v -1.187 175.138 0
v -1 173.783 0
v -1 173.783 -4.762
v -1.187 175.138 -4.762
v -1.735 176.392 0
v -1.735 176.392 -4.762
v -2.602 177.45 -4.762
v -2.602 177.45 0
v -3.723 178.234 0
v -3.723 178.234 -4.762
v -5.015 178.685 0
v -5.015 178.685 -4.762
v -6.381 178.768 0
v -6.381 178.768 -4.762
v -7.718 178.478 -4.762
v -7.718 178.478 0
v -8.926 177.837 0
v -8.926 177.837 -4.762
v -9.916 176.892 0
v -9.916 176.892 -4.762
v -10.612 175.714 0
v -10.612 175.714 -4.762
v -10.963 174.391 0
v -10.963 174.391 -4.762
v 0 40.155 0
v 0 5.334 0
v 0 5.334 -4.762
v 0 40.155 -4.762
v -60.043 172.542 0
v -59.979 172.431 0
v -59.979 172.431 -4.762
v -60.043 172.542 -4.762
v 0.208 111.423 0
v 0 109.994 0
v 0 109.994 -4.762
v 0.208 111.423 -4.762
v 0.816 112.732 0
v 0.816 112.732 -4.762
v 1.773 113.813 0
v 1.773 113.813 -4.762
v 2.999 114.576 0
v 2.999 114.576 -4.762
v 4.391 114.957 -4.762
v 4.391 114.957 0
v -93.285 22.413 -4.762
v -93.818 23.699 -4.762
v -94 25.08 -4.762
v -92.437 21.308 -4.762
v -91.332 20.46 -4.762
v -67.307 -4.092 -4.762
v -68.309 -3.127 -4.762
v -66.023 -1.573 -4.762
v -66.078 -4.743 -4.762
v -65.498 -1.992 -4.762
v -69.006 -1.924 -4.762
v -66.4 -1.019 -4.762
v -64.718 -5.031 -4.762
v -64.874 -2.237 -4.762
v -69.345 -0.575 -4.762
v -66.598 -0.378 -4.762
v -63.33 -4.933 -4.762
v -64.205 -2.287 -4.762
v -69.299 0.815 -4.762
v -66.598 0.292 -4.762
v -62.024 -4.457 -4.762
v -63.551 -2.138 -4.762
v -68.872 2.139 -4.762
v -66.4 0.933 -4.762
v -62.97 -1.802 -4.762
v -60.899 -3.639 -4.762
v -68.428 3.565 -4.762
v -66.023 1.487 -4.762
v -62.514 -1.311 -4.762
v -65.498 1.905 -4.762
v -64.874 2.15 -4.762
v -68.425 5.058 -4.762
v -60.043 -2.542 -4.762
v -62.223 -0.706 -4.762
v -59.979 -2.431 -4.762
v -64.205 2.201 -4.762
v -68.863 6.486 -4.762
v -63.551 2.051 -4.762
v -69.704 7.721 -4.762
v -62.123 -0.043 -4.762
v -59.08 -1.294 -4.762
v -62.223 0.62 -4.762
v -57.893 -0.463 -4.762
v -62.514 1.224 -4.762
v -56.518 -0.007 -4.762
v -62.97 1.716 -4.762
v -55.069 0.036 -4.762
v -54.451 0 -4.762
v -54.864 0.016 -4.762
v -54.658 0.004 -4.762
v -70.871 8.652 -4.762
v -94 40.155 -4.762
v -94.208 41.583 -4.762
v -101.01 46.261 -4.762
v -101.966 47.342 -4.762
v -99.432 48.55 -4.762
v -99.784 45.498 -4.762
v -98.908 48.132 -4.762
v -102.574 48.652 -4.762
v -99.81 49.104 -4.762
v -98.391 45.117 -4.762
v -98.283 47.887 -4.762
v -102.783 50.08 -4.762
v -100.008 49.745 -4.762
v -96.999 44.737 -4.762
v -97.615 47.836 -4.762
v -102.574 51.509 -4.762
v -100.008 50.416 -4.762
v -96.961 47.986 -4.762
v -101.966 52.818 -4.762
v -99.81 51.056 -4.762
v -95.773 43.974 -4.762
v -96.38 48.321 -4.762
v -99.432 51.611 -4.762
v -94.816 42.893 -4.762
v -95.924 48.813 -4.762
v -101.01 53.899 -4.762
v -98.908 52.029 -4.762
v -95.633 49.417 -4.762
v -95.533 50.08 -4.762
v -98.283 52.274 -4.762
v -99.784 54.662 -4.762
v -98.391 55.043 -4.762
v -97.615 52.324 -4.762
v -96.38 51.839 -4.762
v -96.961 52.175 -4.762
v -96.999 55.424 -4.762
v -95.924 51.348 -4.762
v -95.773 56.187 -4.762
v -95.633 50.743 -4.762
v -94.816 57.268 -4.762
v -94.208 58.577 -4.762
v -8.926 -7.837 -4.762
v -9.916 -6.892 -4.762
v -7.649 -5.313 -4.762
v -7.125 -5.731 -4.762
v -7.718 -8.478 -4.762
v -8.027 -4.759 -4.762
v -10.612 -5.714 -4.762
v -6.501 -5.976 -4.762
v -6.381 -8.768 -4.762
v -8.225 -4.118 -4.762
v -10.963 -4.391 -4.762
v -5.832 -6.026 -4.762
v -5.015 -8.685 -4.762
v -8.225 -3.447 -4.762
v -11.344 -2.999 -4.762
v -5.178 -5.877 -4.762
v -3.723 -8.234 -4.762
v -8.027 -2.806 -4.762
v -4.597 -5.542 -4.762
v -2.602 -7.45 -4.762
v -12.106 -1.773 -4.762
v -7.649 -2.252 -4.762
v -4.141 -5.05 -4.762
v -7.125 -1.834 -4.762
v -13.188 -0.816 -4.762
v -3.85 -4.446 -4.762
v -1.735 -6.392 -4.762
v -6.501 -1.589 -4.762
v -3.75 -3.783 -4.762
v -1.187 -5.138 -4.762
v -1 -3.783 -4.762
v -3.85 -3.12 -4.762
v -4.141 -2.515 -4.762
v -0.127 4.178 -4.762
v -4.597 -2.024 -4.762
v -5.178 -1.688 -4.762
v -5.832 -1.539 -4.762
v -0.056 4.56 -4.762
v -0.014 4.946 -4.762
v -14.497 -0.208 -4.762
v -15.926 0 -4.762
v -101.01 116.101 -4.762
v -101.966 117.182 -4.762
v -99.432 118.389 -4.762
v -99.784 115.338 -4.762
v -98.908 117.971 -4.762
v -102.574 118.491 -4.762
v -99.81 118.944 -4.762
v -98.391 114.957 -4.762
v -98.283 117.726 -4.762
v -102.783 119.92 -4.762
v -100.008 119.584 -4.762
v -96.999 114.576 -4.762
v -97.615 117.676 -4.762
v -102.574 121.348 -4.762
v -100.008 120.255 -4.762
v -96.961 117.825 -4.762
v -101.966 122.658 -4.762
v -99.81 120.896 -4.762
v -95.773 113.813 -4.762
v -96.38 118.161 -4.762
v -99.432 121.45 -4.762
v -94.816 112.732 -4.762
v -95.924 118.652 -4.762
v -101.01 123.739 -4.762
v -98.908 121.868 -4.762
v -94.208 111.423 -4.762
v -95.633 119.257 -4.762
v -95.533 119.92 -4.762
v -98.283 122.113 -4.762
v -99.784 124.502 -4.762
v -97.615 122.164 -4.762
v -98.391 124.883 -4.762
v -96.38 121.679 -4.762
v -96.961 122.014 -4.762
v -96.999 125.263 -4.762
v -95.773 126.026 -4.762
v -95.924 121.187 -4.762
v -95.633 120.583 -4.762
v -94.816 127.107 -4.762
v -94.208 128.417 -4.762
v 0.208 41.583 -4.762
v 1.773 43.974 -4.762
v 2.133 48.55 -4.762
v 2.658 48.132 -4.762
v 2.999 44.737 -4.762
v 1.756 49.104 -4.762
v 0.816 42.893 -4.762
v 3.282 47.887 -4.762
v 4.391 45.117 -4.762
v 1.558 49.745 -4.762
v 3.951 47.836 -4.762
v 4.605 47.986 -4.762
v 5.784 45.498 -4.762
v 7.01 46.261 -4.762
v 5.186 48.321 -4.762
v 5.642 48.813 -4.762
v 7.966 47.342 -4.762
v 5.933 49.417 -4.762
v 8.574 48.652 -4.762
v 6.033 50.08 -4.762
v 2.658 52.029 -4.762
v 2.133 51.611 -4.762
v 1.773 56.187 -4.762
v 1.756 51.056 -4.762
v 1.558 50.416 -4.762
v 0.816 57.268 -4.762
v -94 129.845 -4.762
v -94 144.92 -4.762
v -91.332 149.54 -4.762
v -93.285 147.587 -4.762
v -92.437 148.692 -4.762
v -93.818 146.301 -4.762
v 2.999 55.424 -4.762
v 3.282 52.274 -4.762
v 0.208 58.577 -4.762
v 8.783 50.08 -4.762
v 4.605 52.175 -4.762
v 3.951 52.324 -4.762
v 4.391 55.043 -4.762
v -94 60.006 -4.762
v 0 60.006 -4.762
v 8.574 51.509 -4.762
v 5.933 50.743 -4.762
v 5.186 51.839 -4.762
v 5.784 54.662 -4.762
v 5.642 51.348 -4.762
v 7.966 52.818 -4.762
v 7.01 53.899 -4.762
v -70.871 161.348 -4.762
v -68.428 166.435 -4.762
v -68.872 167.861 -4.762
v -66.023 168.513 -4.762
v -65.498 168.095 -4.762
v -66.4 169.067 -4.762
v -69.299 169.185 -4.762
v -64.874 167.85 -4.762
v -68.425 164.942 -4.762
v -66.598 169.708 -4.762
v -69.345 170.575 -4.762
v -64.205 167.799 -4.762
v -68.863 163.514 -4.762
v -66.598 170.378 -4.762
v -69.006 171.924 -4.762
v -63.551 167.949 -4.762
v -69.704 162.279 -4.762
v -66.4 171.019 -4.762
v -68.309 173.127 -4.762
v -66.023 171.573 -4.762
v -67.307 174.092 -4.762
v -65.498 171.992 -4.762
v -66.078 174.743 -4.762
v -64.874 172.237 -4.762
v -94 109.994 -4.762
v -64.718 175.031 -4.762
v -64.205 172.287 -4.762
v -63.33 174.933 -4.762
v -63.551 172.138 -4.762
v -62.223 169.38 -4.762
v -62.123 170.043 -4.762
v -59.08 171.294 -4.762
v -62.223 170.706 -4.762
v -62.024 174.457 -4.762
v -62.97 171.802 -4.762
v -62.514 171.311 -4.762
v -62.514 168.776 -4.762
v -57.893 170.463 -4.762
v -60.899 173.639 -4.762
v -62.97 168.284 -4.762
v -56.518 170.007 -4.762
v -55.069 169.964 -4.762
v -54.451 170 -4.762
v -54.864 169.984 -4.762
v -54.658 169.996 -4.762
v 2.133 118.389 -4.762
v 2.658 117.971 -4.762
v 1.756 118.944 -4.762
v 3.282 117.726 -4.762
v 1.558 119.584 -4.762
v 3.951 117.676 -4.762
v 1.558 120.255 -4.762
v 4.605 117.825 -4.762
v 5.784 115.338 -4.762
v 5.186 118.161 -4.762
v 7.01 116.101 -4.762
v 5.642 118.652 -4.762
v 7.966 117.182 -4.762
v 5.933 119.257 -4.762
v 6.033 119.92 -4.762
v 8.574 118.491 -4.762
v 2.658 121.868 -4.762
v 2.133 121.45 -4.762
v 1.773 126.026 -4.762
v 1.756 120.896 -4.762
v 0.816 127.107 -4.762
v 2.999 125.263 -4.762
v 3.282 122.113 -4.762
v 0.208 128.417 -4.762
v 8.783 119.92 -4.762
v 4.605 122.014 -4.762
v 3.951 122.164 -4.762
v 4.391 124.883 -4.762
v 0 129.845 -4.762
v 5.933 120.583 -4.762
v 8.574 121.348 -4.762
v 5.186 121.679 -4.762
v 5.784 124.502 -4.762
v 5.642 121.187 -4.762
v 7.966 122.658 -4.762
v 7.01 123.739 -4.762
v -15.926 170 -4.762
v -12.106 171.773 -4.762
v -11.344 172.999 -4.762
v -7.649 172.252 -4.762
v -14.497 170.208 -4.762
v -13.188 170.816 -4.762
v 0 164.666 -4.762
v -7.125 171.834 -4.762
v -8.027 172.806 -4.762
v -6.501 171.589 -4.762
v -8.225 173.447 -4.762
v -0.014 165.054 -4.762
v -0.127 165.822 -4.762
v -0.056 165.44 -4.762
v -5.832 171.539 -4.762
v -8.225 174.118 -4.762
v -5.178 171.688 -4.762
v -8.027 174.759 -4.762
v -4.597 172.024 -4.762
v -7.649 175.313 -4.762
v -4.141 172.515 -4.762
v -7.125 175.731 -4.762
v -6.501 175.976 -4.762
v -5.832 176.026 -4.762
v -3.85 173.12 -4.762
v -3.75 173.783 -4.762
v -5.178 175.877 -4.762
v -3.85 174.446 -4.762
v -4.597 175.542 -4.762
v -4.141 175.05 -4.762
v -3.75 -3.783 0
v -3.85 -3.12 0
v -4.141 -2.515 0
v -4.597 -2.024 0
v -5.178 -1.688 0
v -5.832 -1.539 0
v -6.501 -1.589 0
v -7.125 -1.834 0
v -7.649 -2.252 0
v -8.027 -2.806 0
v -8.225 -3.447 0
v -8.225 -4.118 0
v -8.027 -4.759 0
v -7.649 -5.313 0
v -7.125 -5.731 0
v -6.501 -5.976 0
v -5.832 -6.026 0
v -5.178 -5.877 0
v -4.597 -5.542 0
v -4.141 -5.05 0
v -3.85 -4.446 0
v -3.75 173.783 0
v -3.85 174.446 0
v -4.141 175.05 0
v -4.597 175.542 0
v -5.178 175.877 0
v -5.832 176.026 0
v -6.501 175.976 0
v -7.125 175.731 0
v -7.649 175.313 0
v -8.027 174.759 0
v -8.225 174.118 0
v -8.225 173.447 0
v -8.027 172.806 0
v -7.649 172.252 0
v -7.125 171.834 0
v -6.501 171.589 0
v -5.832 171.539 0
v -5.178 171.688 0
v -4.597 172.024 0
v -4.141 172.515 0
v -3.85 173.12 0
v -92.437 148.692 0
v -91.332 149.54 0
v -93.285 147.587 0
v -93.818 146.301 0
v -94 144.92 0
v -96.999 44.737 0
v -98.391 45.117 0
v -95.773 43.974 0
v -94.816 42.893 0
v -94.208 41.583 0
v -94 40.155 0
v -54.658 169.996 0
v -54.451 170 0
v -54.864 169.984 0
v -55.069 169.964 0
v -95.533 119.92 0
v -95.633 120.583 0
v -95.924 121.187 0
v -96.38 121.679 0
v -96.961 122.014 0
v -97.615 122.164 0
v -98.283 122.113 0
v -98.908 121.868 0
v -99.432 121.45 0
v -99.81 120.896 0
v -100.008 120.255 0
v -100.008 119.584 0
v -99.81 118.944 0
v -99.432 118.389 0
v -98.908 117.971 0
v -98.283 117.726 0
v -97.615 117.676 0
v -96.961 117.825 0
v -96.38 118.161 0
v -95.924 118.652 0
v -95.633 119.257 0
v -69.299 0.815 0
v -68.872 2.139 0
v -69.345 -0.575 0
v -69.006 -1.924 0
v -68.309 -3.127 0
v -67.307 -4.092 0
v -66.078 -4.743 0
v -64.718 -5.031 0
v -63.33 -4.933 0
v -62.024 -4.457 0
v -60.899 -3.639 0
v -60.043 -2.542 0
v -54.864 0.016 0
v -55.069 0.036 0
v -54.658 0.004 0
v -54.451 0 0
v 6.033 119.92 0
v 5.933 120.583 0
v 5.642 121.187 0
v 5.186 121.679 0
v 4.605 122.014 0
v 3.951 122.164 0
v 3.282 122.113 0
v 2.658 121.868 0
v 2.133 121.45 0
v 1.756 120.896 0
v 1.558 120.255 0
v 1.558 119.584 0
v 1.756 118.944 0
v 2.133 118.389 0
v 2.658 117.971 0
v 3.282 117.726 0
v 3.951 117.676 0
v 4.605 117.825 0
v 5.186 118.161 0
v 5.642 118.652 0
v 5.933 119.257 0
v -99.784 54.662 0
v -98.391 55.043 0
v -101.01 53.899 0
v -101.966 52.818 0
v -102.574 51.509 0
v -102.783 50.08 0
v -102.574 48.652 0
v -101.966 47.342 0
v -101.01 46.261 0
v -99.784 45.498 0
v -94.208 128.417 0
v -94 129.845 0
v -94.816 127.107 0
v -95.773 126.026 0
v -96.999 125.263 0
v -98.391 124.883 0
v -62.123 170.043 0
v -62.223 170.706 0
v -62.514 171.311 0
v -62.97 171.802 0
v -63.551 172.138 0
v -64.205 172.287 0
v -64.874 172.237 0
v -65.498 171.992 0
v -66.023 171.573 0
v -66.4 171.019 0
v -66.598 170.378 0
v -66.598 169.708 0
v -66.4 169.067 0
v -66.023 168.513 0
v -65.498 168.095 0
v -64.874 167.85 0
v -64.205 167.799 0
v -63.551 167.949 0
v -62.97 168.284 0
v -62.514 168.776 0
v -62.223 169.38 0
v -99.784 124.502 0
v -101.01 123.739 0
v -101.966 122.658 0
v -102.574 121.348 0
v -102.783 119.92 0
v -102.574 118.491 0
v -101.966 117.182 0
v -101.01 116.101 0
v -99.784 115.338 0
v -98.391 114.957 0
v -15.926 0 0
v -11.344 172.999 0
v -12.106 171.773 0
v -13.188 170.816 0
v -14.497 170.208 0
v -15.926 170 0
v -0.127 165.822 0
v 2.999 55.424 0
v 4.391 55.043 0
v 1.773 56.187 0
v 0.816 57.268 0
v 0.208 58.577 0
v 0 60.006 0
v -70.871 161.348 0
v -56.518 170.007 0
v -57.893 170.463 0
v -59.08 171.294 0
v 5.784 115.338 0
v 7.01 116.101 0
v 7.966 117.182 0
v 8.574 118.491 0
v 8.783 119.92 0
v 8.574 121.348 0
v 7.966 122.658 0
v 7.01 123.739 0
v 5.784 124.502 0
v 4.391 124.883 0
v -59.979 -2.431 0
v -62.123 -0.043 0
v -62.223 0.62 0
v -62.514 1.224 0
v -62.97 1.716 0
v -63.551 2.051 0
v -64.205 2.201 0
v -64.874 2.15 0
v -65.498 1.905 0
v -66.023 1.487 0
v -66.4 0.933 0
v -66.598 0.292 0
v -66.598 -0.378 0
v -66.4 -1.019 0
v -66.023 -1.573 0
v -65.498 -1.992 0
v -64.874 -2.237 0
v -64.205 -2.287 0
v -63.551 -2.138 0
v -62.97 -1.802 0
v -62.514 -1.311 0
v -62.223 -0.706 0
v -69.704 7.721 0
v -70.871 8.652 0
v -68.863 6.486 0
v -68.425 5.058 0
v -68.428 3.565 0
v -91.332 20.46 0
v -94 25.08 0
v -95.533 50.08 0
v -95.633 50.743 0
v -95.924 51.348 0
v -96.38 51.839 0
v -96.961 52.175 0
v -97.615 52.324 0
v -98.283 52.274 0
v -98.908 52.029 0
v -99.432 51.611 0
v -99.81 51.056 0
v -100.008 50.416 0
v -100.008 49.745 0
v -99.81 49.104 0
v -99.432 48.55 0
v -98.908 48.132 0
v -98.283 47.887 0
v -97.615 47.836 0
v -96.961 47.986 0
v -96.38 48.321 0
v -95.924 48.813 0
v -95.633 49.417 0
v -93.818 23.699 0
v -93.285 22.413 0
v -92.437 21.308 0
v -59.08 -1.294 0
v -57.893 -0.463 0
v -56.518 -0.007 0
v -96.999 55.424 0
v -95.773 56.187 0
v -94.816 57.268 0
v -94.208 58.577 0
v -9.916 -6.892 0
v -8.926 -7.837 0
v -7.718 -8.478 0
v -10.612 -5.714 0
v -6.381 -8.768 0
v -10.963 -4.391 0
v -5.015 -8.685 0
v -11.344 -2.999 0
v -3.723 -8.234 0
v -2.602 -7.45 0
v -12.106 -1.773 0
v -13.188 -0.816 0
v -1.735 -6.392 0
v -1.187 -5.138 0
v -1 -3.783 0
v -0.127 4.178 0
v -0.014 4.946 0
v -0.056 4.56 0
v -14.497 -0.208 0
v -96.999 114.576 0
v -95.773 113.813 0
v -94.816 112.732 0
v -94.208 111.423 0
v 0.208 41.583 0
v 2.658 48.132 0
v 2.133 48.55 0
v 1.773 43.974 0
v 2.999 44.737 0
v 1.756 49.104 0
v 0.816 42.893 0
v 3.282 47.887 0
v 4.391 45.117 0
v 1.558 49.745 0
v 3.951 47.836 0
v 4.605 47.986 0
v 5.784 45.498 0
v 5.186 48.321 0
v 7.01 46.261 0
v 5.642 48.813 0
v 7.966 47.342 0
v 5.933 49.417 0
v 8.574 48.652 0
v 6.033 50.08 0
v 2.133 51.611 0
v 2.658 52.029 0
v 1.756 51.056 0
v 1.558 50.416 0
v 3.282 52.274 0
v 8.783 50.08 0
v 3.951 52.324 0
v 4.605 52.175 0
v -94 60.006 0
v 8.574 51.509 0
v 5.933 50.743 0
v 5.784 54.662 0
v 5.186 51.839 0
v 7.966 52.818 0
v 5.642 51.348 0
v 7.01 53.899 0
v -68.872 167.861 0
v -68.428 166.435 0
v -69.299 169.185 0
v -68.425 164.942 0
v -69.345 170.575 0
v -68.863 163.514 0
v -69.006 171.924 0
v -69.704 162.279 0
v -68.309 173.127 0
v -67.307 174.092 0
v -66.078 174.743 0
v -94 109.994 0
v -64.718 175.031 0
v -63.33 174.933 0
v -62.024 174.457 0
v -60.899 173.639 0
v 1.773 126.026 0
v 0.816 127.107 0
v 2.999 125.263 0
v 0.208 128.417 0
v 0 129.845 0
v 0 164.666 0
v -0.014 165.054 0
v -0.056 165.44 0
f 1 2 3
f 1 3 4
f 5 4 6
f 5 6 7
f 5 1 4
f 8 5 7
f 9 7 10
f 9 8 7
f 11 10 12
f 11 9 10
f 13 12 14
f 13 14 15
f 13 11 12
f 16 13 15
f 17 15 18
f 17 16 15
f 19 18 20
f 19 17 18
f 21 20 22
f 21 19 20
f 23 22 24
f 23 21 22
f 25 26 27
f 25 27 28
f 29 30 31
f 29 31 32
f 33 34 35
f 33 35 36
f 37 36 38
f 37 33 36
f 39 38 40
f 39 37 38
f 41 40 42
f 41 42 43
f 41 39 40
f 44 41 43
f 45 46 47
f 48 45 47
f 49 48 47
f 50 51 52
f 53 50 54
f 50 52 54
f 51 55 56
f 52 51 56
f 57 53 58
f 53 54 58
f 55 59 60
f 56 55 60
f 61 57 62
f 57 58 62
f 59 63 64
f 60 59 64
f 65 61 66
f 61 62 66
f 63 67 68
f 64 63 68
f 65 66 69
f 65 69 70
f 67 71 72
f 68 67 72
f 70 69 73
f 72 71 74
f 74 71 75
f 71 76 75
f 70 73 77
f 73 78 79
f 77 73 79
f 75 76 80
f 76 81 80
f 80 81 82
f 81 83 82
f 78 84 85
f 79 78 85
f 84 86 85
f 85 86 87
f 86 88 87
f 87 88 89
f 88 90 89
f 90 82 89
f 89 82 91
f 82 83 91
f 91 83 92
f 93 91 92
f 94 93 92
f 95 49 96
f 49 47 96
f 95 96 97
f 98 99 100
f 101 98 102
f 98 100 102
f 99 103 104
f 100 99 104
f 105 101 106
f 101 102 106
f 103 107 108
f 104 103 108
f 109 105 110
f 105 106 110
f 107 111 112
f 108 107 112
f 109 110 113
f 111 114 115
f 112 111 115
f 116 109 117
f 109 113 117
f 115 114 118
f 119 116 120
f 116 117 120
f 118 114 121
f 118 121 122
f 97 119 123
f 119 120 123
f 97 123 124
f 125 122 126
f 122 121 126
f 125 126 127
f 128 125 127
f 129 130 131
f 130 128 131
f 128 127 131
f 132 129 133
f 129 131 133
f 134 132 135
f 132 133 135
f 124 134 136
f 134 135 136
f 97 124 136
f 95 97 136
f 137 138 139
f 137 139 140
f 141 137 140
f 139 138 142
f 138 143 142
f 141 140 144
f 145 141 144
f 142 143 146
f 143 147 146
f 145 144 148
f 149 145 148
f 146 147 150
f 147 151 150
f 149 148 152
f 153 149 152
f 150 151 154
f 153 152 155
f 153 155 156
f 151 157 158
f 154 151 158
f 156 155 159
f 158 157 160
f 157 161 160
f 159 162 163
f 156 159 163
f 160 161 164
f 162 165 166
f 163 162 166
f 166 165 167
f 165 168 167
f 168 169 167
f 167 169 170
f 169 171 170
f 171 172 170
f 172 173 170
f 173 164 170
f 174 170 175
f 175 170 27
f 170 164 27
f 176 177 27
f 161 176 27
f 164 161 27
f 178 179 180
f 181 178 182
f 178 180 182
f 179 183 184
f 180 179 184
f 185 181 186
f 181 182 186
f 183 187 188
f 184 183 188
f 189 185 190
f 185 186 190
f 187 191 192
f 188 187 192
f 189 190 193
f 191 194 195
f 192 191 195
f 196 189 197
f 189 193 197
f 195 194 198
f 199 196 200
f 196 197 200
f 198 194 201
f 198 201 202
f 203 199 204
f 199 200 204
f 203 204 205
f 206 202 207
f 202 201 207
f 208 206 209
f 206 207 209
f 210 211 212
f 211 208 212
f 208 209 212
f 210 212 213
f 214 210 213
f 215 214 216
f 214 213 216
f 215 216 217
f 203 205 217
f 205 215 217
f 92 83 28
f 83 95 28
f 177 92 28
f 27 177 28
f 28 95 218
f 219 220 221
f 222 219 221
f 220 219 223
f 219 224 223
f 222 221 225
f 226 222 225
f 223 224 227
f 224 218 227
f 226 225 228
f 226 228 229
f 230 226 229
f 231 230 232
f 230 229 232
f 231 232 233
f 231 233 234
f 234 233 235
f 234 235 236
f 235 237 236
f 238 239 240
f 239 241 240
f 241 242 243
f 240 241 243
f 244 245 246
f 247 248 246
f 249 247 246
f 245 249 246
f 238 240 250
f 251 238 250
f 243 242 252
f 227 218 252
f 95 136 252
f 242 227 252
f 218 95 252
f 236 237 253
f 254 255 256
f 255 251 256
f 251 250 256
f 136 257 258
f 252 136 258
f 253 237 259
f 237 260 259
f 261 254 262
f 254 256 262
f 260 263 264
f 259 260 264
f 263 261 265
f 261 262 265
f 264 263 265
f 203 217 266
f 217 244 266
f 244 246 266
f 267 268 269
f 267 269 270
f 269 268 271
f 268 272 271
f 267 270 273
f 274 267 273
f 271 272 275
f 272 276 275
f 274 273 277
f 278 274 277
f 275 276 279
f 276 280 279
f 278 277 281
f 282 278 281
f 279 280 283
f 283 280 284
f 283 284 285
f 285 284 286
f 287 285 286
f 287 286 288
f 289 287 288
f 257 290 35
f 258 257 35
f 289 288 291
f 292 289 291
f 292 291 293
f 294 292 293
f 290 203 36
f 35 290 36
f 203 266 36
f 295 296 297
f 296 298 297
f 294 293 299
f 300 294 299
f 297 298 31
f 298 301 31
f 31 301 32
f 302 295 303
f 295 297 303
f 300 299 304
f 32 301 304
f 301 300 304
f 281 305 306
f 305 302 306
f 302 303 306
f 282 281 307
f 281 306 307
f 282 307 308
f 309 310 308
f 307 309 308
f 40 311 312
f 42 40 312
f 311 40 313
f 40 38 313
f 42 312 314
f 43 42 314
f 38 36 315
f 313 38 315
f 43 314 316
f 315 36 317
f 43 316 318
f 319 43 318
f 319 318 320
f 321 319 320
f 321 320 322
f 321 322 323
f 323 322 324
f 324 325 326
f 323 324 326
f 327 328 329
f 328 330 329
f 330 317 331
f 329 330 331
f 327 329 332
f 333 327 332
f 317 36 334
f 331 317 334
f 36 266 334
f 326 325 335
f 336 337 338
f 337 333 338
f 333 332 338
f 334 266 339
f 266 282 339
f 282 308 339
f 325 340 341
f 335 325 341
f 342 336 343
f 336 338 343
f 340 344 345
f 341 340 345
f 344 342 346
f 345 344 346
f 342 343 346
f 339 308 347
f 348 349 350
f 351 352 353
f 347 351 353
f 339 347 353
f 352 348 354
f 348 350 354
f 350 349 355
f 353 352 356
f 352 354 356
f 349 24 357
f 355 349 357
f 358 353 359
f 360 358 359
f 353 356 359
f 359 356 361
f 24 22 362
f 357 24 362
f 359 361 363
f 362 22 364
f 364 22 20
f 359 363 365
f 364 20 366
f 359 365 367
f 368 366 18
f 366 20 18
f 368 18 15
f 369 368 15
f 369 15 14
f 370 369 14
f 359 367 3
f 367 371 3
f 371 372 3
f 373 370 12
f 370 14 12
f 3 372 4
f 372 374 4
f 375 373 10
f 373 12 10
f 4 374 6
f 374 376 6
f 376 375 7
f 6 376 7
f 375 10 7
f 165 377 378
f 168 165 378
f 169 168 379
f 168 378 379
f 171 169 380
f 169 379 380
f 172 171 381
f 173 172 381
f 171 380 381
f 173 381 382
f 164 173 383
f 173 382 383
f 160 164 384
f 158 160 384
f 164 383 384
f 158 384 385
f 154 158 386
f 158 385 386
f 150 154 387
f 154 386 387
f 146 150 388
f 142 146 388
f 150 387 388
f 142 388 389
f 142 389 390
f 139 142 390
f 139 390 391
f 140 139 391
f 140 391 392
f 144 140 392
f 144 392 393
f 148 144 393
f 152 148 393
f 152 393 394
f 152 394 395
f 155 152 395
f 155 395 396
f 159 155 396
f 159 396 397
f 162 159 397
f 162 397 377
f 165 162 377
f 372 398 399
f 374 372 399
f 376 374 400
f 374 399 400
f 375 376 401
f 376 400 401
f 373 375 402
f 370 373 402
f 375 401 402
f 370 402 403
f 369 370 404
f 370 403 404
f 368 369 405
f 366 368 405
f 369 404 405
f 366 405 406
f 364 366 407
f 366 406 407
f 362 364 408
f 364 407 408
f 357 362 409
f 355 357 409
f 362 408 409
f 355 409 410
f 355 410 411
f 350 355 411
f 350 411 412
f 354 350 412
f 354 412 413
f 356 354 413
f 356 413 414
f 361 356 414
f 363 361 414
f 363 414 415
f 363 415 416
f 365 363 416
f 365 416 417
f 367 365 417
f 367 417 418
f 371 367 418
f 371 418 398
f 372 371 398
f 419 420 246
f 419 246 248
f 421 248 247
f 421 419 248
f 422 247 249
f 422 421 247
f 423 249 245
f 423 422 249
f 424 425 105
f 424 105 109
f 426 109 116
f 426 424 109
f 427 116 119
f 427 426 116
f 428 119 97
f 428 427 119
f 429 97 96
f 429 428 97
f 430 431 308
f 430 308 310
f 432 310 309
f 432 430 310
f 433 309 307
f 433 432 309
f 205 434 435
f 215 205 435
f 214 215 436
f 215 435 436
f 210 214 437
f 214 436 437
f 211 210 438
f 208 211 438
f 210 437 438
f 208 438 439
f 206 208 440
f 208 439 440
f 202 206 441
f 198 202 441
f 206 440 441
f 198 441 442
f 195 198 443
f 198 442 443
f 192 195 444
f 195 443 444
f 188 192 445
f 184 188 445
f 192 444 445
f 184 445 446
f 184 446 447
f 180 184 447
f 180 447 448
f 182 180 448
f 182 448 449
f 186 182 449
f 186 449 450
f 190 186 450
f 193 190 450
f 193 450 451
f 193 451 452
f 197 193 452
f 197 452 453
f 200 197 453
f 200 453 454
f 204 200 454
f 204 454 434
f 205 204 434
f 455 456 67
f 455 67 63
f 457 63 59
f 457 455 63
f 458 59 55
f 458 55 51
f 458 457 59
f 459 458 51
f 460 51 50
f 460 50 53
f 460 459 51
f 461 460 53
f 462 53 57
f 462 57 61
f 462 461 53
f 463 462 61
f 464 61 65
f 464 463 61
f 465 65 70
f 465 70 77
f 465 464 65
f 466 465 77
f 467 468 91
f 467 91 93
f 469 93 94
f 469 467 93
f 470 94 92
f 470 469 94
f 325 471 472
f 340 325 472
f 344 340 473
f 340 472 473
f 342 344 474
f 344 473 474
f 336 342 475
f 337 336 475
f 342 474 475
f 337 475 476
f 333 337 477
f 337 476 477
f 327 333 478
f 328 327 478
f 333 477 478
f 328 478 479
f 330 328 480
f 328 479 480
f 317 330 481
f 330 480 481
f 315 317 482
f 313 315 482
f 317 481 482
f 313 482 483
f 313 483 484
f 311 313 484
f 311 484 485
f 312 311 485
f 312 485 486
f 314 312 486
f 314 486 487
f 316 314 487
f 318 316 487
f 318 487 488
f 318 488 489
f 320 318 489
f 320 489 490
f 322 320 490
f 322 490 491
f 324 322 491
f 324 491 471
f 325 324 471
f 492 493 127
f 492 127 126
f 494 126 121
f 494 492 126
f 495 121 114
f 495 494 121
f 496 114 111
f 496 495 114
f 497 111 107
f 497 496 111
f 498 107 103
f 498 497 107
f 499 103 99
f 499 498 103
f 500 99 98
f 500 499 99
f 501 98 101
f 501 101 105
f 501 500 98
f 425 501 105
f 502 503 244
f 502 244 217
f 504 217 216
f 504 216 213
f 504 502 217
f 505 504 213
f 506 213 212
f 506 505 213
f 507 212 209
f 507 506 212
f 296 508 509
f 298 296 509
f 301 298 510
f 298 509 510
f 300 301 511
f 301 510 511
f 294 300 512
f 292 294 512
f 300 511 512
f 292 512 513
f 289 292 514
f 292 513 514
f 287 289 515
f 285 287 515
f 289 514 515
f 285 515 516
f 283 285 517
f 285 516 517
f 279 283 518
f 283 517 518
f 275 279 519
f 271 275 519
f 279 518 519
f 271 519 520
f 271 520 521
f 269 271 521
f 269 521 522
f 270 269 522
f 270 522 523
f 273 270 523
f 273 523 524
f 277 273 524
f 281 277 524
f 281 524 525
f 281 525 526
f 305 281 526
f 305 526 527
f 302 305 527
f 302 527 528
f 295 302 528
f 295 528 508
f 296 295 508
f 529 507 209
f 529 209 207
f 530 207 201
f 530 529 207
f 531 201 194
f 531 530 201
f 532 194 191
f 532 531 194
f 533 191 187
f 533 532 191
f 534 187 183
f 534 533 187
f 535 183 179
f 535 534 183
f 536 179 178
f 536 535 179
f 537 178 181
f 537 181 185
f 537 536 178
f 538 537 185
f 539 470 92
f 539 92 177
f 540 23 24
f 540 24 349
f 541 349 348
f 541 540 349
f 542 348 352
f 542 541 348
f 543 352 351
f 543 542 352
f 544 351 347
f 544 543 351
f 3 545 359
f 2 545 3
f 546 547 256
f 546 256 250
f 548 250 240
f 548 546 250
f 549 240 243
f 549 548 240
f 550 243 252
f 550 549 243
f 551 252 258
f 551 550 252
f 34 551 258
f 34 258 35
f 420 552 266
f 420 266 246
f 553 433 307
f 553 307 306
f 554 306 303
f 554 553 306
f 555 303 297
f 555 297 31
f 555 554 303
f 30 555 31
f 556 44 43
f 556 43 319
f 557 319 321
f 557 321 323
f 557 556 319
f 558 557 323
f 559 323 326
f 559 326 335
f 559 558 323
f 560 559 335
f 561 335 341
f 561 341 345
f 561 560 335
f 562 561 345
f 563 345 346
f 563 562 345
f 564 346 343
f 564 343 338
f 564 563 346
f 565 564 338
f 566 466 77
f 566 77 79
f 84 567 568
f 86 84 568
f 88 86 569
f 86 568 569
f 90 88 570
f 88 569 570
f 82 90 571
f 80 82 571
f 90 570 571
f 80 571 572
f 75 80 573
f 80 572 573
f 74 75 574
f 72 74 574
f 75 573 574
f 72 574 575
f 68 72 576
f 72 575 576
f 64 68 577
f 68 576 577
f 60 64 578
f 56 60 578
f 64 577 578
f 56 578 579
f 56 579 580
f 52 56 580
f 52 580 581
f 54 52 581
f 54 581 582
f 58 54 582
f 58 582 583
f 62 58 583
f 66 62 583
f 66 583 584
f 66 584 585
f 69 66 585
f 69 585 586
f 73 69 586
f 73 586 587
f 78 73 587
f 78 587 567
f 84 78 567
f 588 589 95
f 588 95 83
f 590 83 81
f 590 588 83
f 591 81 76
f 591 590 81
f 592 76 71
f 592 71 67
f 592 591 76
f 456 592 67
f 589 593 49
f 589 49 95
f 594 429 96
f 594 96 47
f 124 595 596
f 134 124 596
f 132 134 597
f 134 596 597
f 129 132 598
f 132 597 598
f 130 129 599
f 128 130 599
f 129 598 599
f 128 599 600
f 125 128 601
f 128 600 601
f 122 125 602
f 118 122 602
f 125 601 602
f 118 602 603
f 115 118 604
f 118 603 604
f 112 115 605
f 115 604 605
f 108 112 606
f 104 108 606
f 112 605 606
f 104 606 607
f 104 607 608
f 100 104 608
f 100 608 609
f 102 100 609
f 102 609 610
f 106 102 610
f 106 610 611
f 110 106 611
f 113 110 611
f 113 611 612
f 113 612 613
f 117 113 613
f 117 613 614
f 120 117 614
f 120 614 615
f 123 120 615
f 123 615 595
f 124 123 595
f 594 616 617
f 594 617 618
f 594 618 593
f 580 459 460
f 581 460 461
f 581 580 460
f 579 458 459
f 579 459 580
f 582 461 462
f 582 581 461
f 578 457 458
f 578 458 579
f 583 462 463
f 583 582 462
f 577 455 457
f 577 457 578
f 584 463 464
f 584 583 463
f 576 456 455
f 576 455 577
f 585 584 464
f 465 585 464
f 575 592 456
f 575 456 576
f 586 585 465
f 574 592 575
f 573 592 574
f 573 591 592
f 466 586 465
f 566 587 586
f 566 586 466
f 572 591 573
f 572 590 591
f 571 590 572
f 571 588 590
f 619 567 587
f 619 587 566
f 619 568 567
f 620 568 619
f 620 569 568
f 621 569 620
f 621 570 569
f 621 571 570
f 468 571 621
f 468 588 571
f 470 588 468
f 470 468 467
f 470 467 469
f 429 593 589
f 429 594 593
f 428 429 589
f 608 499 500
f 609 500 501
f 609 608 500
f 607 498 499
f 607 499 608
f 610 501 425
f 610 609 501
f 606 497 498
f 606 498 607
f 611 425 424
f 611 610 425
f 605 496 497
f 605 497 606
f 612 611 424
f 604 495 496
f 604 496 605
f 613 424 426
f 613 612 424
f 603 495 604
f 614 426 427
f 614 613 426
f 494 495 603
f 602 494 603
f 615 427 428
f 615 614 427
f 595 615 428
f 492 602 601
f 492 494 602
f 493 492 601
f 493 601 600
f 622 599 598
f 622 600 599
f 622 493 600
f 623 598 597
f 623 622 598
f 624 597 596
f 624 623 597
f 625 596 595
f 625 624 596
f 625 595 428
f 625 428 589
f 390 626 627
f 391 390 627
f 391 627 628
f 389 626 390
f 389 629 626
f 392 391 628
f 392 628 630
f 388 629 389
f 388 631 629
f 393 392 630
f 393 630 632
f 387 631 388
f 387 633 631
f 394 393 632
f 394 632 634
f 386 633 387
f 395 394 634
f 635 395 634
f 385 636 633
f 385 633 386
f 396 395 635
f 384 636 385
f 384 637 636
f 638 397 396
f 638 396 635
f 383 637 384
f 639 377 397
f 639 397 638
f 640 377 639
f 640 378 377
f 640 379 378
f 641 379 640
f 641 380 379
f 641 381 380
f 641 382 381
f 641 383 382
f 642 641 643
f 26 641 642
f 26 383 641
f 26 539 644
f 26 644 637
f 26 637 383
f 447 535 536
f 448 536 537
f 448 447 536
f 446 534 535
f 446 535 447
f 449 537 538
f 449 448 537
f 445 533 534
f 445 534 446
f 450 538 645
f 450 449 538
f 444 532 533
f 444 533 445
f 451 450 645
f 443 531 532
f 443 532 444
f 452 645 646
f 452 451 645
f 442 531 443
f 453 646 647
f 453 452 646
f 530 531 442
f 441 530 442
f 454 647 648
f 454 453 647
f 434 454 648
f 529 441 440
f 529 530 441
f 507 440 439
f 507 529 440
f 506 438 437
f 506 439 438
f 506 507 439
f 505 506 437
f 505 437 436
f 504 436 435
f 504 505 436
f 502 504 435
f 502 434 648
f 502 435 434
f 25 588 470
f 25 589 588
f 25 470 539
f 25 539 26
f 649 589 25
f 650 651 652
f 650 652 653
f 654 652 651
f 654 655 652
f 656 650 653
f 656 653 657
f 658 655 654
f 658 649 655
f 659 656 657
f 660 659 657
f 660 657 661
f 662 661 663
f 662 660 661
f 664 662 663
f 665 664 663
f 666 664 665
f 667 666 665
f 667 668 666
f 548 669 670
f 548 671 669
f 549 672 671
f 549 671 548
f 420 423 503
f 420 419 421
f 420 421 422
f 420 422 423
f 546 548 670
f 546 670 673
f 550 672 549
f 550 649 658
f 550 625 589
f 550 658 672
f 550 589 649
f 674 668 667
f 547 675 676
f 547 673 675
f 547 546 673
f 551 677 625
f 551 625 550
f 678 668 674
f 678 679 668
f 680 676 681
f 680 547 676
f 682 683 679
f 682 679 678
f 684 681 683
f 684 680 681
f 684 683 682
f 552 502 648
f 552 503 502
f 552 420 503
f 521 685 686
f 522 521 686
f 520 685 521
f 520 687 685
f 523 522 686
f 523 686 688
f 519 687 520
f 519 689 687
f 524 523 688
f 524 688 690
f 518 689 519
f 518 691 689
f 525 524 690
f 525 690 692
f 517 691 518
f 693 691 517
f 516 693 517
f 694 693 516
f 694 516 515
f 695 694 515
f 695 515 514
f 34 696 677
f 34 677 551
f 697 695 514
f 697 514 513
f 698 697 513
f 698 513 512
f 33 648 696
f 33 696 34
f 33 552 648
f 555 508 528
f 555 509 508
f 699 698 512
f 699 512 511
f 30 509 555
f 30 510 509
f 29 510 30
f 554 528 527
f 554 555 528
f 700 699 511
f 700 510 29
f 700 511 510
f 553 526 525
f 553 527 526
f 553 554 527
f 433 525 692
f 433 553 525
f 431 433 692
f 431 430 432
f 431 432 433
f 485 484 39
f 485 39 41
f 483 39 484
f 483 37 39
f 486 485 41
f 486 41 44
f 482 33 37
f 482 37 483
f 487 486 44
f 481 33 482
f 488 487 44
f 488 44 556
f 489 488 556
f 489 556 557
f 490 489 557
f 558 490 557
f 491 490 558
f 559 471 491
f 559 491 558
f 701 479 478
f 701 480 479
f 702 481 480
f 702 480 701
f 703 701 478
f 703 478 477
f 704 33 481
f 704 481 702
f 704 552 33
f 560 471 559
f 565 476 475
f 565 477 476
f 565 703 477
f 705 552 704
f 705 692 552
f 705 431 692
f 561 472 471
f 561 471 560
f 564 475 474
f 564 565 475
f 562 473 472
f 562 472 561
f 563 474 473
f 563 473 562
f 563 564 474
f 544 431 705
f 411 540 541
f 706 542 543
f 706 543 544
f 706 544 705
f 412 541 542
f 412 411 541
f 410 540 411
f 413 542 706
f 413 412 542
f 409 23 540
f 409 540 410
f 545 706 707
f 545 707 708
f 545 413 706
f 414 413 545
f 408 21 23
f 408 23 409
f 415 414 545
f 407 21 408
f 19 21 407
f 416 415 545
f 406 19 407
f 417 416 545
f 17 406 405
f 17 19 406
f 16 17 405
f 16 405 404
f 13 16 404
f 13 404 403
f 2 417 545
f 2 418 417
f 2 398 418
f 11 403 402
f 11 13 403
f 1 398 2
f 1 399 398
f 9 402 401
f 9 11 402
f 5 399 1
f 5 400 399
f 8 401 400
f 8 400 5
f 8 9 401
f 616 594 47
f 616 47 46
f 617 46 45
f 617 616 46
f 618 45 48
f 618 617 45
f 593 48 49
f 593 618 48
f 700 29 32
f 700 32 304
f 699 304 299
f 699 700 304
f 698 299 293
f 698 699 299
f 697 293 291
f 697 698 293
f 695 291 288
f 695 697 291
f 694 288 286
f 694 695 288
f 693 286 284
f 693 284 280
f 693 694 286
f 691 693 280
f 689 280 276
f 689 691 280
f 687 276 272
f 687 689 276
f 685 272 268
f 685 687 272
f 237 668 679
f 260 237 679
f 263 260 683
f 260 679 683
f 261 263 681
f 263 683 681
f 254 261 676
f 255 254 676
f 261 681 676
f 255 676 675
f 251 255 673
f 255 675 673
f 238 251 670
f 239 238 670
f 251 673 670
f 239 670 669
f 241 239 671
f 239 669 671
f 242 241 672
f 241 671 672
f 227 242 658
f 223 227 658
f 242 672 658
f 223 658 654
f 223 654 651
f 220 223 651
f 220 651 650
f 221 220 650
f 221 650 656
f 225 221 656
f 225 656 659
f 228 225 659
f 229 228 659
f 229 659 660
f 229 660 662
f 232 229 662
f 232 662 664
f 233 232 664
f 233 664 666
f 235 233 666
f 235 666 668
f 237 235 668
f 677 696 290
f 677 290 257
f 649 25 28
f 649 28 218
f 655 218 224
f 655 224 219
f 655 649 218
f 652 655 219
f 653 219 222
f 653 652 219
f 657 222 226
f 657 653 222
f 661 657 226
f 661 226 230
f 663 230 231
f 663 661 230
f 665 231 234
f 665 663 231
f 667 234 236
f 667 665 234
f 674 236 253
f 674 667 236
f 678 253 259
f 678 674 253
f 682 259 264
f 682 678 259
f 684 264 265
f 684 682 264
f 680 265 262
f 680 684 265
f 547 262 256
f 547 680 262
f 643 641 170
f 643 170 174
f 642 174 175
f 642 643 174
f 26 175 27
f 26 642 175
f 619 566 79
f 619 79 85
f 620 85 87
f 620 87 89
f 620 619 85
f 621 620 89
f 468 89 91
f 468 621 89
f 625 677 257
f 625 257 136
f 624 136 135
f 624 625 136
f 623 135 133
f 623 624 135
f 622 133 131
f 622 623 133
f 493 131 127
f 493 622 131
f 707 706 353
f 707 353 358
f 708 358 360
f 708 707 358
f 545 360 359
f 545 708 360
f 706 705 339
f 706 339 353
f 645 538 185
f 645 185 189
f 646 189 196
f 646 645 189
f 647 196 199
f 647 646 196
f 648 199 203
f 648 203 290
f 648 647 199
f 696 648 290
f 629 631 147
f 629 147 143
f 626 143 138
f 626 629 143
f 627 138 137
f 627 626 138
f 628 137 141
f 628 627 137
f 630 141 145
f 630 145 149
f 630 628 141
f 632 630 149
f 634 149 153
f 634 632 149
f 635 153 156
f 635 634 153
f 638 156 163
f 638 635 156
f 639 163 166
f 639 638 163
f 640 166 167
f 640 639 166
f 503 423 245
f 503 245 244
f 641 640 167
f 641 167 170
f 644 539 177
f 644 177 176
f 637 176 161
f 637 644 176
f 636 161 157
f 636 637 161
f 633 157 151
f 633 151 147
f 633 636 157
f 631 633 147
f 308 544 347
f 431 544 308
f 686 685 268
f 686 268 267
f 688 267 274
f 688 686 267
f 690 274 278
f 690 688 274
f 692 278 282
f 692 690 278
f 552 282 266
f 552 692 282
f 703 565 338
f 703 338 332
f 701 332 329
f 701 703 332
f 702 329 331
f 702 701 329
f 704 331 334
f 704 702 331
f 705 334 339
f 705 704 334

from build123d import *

# Parameters (mm, degrees)
BOSS_EXTRUDE1_DEPTH  = 4.7625
M4_CLEARANCE_HOLE1_D = 4.5


with BuildPart() as part:
    # Sketch1 → Boss-Extrude1 (new body)
    with BuildSketch(Plane.XY):
        with BuildLine():
            Line((-94, 144.919812433), (-94, 129.845444943))
            ThreePointArc((-94, 129.845444943), (-95.255453966, 126.532081848), (-98.39135, 124.882628688))
            ThreePointArc((-98.39135, 124.882628688), (-102.7827, 119.919812433), (-98.39135, 114.956996179))
            ThreePointArc((-98.39135, 114.956996179), (-95.255453966, 113.307543019), (-94, 109.994179924))
            Line((-94, 109.994179924), (-94, 60.005820076))
            ThreePointArc((-94, 60.005820076), (-95.255453966, 56.692456981), (-98.39135, 55.043003821))
            ThreePointArc((-98.39135, 55.043003821), (-102.7827, 50.080187567), (-98.39135, 45.117371312))
            ThreePointArc((-98.39135, 45.117371312), (-95.255453966, 43.467918152), (-94, 40.154555057))
            Line((-94, 40.154555057), (-94, 25.080187567))
            ThreePointArc((-94, 25.080187567), (-93.285154037, 22.412797084), (-91.332218978, 20.460357228))
            Line((-91.332218978, 20.460357228), (-70.871308953, 8.651857213))
            ThreePointArc((-70.871308953, 8.651857213), (-68.590749548, 5.788703611), (-68.871909852, 2.13910793))
            ThreePointArc((-68.871909852, 2.13910793), (-66.715485478, -4.460545697), (-60.042693242, -2.542359614))
            Line((-60.042693242, -2.542359614), (-59.97854154, -2.431202209))
            ThreePointArc((-59.97854154, -2.431202209), (-57.893008537, -0.462819662), (-55.068956864, 0.035888574))
            ThreePointArc((-55.068956864, 0.035888574), (-54.760620401, 0.008979702), (-54.451242271, 0))
            Line((-54.451242271, 0), (-15.925632509, 0))
            ThreePointArc((-15.925632509, 0), (-12.612269414, -1.255453966), (-10.962816255, -4.39135))
            ThreePointArc((-10.962816255, -4.39135), (-5.69510762, -8.773395406), (-1, -3.7827))
            Line((-1, -3.7827), (-0.126827546, 4.177751308))
            ThreePointArc((-0.126827546, 4.177751308), (-0.031801689, 4.752408162), (0, 5.334))
            Line((0, 5.334), (0, 40.154555057))
            ThreePointArc((0, 40.154555057), (1.255453966, 43.467918152), (4.39135, 45.117371312))
            ThreePointArc((4.39135, 45.117371312), (8.7827, 50.080187567), (4.39135, 55.043003821))
            ThreePointArc((4.39135, 55.043003821), (1.255453966, 56.692456981), (0, 60.005820076))
            Line((0, 60.005820076), (0, 109.994179924))
            ThreePointArc((0, 109.994179924), (1.255453966, 113.307543019), (4.39135, 114.956996179))
            ThreePointArc((4.39135, 114.956996179), (8.7827, 119.919812433), (4.39135, 124.882628688))
            ThreePointArc((4.39135, 124.882628688), (1.255453966, 126.532081848), (0, 129.845444943))
            Line((0, 129.845444943), (0, 164.666))
            ThreePointArc((0, 164.666), (-0.031801689, 165.247591838), (-0.126827546, 165.822248692))
            Line((-0.126827546, 165.822248692), (-1, 173.7827))
            ThreePointArc((-1, 173.7827), (-5.69510762, 178.773395406), (-10.962816255, 174.39135))
            ThreePointArc((-10.962816255, 174.39135), (-12.612269414, 171.255453966), (-15.925632509, 170))
            Line((-15.925632509, 170), (-54.451242271, 170))
            ThreePointArc((-54.451242271, 170), (-54.760620401, 169.991020298), (-55.068956864, 169.964111426))
            ThreePointArc((-55.068956864, 169.964111426), (-57.893008537, 170.462819662), (-59.97854154, 172.431202209))
            Line((-59.97854154, 172.431202209), (-60.042693242, 172.542359614))
            ThreePointArc((-60.042693242, 172.542359614), (-66.715485478, 174.460545697), (-68.871909852, 167.86089207))
            ThreePointArc((-68.871909852, 167.86089207), (-68.590749548, 164.211296389), (-70.871308953, 161.348142787))
            Line((-70.871308953, 161.348142787), (-91.332218978, 149.539642772))
            ThreePointArc((-91.332218978, 149.539642772), (-93.285154037, 147.587202916), (-94, 144.919812433))
        make_face()
    extrude(amount=-BOSS_EXTRUDE1_DEPTH)

    # M4 Clearance Hole1 (through all)
    with Locations(Plane(origin=(0, 0, -4.7625), x_dir=(-1, 0, 0), z_dir=(0, 0, -1))):
        with Locations((6, -3.7827), (-3.7827, 50.080187567), (-3.7827, 119.919812433), (6, 173.7827), (64.373242866, 170.04309173), (97.7827, 119.919812433), (97.7827, 50.080187567), (64.373242866, -0.04309173)):
            Hole(M4_CLEARANCE_HOLE1_D / 2)


solid = part.part
